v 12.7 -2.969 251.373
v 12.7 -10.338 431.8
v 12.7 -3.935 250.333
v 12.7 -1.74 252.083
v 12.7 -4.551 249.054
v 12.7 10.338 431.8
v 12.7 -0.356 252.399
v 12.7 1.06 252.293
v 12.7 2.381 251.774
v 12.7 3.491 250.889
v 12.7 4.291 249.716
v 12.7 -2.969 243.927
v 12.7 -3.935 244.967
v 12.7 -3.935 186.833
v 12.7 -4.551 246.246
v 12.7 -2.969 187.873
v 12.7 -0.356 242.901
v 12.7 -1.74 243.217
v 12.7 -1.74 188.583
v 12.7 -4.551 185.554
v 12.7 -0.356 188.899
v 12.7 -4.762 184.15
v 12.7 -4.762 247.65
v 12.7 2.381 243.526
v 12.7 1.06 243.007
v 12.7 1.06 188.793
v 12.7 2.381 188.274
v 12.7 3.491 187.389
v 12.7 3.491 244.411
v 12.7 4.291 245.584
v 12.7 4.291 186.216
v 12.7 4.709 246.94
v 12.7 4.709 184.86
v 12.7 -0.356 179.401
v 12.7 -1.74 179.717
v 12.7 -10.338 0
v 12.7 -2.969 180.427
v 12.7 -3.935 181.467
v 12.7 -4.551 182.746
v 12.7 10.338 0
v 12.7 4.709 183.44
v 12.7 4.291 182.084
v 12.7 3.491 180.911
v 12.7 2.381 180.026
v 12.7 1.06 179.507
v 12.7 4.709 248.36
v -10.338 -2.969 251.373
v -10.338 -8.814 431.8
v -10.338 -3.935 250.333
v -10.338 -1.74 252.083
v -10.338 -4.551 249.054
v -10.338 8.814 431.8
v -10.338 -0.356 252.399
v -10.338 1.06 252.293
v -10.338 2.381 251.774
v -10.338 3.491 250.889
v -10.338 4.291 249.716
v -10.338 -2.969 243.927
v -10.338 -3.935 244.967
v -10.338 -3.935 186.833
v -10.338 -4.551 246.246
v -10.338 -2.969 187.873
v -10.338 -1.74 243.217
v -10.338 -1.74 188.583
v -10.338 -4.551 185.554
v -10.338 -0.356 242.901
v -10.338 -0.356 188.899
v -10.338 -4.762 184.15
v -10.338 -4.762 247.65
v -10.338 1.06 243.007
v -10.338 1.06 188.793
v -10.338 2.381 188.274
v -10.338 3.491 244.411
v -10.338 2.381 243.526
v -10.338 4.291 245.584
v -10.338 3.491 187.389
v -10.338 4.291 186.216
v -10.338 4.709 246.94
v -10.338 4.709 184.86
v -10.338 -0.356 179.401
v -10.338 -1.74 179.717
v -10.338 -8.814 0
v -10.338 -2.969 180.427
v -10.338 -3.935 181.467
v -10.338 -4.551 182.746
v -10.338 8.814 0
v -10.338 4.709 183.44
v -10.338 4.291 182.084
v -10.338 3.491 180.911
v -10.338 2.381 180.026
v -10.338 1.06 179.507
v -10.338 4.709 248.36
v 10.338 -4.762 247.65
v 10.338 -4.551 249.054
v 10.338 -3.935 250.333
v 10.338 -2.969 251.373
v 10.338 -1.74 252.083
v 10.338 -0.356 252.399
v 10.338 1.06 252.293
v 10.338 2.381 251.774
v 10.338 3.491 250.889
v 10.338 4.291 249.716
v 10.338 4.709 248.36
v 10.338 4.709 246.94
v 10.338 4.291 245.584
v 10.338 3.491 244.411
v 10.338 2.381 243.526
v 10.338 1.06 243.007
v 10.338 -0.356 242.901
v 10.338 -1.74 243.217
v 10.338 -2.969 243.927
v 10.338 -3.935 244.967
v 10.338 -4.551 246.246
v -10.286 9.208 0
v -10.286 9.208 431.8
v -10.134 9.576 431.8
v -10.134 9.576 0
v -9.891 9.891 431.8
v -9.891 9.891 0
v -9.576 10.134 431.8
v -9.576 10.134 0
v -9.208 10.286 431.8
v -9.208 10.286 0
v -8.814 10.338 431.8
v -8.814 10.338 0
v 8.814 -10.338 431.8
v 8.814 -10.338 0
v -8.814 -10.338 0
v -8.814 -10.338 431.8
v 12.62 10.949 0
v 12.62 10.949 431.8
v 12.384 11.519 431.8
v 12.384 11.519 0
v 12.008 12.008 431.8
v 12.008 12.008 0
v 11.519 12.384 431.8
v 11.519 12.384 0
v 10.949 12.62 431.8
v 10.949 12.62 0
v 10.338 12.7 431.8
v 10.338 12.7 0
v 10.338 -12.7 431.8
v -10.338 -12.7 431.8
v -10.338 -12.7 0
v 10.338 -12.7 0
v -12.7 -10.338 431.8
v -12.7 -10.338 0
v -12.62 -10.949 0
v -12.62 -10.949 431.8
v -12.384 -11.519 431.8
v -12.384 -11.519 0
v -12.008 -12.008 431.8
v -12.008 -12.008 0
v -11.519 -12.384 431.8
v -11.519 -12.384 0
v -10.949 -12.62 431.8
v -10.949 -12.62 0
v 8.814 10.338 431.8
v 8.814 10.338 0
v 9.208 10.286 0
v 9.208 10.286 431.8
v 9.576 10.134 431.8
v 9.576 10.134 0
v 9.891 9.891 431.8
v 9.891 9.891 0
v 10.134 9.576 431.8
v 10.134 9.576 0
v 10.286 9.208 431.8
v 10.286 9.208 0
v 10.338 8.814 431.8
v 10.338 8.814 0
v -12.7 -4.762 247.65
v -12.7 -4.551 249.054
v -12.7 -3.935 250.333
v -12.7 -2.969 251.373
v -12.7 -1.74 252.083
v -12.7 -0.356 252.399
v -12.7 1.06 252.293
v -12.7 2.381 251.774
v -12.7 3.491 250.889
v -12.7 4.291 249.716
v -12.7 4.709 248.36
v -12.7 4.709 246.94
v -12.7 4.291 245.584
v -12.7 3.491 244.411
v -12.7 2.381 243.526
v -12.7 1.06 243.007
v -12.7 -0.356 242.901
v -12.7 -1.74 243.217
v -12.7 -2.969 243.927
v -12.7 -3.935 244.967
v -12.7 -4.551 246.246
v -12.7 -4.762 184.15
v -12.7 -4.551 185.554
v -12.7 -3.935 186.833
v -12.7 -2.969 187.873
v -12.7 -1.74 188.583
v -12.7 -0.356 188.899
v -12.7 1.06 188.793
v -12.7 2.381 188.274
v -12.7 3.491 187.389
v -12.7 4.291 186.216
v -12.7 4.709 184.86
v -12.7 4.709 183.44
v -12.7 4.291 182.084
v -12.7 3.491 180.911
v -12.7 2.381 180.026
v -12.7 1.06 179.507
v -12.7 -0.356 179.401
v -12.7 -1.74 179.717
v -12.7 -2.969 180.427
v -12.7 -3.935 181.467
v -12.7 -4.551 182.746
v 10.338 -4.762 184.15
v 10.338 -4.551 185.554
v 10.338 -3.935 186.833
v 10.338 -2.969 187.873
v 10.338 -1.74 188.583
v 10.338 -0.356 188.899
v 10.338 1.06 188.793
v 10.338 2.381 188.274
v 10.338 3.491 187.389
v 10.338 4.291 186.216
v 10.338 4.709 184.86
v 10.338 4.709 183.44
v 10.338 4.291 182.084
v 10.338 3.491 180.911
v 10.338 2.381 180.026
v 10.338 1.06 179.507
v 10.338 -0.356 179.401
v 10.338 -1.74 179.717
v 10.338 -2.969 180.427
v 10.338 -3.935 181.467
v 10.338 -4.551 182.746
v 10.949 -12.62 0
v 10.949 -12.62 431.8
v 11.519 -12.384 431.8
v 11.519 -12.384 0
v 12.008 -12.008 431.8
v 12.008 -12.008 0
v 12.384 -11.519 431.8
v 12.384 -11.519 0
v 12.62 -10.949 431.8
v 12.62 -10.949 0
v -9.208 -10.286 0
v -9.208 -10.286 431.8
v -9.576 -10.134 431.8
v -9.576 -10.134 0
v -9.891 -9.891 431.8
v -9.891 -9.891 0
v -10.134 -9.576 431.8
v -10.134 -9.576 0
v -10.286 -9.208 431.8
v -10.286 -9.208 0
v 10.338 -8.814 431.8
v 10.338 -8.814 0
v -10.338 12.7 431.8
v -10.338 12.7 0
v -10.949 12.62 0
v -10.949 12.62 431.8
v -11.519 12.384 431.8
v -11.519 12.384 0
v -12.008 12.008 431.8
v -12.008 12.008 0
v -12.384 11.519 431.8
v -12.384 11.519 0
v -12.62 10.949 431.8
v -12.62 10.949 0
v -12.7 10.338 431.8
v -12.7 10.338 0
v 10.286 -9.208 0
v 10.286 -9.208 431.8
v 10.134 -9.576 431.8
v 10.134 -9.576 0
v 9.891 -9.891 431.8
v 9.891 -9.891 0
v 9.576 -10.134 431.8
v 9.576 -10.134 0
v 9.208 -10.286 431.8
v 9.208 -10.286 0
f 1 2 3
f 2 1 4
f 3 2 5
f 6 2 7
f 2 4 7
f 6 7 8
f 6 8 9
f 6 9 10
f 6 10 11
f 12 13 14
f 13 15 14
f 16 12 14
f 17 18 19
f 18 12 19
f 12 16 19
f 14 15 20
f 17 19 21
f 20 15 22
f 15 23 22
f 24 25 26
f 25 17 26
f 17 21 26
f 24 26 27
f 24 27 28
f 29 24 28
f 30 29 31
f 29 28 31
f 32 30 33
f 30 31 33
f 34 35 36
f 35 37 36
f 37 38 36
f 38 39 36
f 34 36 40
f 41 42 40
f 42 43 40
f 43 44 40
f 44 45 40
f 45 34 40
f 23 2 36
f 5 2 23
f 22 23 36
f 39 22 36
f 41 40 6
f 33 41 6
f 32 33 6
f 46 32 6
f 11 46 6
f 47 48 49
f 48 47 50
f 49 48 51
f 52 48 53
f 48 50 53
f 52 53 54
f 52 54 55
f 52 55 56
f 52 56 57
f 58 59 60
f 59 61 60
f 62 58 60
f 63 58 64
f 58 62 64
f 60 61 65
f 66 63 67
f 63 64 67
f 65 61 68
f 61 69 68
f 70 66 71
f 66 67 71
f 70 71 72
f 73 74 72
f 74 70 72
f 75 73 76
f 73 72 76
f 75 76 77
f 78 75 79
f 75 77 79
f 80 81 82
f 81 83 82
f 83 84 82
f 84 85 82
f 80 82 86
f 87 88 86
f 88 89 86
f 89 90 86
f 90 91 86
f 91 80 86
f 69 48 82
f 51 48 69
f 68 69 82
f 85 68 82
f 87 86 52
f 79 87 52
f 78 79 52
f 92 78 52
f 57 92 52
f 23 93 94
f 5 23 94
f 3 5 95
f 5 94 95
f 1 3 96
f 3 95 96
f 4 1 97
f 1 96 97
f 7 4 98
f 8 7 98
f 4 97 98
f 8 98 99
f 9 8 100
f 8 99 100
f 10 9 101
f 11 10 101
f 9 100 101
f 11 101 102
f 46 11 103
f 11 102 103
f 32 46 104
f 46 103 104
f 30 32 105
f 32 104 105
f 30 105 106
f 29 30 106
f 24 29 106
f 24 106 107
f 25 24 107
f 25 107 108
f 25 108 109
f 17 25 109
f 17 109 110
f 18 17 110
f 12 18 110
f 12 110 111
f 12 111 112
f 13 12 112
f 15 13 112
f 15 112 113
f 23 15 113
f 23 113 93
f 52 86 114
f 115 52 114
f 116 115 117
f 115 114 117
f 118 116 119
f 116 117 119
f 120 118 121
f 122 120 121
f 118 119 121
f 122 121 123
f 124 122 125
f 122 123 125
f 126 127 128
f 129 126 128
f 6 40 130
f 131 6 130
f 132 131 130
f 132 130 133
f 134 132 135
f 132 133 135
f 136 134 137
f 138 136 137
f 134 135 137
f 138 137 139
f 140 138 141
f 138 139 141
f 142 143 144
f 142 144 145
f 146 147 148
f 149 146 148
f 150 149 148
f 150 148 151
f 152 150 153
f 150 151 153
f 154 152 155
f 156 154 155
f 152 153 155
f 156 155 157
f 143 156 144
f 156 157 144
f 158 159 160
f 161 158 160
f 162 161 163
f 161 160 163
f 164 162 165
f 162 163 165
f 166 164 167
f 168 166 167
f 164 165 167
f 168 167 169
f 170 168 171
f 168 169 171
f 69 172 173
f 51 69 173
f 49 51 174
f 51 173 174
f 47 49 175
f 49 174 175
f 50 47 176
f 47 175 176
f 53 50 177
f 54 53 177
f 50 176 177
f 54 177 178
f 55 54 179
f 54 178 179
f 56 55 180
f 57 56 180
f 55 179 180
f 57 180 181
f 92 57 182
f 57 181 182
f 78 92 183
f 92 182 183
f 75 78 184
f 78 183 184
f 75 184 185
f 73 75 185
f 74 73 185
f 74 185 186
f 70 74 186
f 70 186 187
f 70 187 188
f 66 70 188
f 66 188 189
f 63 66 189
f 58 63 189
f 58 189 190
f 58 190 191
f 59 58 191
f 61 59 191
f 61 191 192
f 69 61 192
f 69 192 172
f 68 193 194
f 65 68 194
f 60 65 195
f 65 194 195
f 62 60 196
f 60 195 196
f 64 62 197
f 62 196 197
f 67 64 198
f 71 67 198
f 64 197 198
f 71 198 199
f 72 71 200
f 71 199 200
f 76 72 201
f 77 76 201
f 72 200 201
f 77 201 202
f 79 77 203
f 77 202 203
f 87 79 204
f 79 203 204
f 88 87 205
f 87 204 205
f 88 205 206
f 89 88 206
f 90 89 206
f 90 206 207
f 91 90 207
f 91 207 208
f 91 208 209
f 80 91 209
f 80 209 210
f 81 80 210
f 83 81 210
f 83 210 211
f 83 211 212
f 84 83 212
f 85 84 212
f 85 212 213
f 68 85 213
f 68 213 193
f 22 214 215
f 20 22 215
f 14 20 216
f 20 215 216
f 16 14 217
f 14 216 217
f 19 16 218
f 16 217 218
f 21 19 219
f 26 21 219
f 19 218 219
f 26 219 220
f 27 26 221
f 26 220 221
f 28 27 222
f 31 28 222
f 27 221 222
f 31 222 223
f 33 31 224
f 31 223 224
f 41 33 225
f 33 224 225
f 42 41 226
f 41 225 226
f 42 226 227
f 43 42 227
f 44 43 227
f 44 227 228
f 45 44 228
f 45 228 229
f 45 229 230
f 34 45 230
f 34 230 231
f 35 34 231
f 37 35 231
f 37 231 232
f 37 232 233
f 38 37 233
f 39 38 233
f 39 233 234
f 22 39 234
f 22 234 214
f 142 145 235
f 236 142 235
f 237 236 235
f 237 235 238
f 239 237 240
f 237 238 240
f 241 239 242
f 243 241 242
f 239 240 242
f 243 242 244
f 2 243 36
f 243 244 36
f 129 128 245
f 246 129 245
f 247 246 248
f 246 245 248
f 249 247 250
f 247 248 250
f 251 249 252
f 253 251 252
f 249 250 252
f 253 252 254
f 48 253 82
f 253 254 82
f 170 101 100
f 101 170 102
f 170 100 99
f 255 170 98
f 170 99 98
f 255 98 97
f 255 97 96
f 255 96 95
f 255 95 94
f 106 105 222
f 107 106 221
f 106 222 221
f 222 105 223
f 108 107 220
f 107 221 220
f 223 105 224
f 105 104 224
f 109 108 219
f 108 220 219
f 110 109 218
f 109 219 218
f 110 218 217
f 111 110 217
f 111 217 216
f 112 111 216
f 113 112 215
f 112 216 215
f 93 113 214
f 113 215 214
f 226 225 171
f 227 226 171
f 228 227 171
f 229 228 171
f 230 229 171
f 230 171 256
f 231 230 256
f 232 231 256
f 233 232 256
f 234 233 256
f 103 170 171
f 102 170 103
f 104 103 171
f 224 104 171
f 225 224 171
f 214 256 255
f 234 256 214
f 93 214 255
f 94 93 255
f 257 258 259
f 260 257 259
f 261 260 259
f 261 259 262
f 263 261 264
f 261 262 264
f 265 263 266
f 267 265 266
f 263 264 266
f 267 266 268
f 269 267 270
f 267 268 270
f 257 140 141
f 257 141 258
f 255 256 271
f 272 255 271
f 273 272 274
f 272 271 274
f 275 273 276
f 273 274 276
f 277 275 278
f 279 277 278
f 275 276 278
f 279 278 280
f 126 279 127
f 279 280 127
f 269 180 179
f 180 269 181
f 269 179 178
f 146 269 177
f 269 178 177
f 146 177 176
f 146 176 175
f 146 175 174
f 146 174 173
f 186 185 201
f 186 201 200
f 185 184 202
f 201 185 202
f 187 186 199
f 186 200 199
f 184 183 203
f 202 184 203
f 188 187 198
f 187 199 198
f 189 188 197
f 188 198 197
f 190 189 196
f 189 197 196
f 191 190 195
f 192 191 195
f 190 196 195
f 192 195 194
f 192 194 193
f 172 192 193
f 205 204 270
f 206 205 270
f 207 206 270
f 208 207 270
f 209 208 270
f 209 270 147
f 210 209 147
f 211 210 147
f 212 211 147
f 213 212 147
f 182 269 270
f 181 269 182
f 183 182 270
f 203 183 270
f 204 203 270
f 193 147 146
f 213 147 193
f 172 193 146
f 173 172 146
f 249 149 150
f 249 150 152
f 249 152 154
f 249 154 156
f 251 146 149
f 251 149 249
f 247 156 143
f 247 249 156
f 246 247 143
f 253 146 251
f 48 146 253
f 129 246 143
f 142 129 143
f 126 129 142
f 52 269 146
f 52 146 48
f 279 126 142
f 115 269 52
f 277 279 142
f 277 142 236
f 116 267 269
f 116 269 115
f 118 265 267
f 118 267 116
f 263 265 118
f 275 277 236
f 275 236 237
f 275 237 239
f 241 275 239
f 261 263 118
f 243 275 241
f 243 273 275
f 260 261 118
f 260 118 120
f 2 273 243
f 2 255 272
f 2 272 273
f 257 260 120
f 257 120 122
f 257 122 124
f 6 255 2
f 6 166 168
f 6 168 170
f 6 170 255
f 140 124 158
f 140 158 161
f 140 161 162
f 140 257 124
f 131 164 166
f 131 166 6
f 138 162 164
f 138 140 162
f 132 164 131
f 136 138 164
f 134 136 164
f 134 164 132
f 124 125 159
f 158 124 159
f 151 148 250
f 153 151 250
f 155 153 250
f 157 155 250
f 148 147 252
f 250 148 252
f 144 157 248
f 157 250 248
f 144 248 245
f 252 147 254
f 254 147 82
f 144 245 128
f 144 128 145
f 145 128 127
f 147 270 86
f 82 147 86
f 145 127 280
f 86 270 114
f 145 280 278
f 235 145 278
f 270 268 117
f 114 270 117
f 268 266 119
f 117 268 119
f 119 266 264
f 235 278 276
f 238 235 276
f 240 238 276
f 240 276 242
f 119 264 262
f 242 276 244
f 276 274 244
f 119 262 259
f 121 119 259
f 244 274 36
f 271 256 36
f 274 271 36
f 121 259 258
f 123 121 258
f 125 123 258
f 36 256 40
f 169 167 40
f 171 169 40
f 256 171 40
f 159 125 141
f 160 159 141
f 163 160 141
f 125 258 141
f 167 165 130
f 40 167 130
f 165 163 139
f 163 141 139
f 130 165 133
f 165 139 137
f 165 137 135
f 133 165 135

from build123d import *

# Parameters (mm, degrees)
F1_DEPTH = 431.8
F3_D     = 9.525


with BuildPart() as f1:
    # F0 (on Top) → F1 (new body)
    with BuildSketch(Plane.XY):
        with BuildLine():
            ThreePointArc((-10.3378, 12.7), (-12.008128, 12.008128), (-12.7, 10.3378))
            Line((-12.7, 10.3378), (-12.7, -10.3378))
            ThreePointArc((-12.7, -10.3378), (-12.008128, -12.008128), (-10.3378, -12.7))
            Line((-10.3378, -12.7), (10.3378, -12.7))
            ThreePointArc((10.3378, -12.7), (12.008128, -12.008128), (12.7, -10.3378))
            Line((12.7, -10.3378), (12.7, 10.3378))
            ThreePointArc((12.7, 10.3378), (12.008128, 12.008128), (10.3378, 12.7))
            Line((10.3378, 12.7), (-10.3378, 12.7))
        make_face()
        with BuildLine():
            Line((-8.8138, 10.3378), (8.8138, 10.3378))
            ThreePointArc((8.8138, 10.3378), (9.891431, 9.891431), (10.3378, 8.8138))
            Line((10.3378, 8.8138), (10.3378, -8.8138))
            ThreePointArc((10.3378, -8.8138), (9.891431, -9.891431), (8.8138, -10.3378))
            Line((8.8138, -10.3378), (-8.8138, -10.3378))
            ThreePointArc((-8.8138, -10.3378), (-9.891431, -9.891431), (-10.3378, -8.8138))
            Line((-10.3378, -8.8138), (-10.3378, 8.8138))
            ThreePointArc((-10.3378, 8.8138), (-9.891431, 9.891431), (-8.8138, 10.3378))
        make_face(mode=Mode.SUBTRACT)
    extrude(amount=F1_DEPTH)

    # F3 (through all)
    with Locations(Plane.YZ.offset(12.7)):
        with Locations((0, 247.65), (0, 184.15)):
            Hole(F3_D / 2)


solid = f1.part
